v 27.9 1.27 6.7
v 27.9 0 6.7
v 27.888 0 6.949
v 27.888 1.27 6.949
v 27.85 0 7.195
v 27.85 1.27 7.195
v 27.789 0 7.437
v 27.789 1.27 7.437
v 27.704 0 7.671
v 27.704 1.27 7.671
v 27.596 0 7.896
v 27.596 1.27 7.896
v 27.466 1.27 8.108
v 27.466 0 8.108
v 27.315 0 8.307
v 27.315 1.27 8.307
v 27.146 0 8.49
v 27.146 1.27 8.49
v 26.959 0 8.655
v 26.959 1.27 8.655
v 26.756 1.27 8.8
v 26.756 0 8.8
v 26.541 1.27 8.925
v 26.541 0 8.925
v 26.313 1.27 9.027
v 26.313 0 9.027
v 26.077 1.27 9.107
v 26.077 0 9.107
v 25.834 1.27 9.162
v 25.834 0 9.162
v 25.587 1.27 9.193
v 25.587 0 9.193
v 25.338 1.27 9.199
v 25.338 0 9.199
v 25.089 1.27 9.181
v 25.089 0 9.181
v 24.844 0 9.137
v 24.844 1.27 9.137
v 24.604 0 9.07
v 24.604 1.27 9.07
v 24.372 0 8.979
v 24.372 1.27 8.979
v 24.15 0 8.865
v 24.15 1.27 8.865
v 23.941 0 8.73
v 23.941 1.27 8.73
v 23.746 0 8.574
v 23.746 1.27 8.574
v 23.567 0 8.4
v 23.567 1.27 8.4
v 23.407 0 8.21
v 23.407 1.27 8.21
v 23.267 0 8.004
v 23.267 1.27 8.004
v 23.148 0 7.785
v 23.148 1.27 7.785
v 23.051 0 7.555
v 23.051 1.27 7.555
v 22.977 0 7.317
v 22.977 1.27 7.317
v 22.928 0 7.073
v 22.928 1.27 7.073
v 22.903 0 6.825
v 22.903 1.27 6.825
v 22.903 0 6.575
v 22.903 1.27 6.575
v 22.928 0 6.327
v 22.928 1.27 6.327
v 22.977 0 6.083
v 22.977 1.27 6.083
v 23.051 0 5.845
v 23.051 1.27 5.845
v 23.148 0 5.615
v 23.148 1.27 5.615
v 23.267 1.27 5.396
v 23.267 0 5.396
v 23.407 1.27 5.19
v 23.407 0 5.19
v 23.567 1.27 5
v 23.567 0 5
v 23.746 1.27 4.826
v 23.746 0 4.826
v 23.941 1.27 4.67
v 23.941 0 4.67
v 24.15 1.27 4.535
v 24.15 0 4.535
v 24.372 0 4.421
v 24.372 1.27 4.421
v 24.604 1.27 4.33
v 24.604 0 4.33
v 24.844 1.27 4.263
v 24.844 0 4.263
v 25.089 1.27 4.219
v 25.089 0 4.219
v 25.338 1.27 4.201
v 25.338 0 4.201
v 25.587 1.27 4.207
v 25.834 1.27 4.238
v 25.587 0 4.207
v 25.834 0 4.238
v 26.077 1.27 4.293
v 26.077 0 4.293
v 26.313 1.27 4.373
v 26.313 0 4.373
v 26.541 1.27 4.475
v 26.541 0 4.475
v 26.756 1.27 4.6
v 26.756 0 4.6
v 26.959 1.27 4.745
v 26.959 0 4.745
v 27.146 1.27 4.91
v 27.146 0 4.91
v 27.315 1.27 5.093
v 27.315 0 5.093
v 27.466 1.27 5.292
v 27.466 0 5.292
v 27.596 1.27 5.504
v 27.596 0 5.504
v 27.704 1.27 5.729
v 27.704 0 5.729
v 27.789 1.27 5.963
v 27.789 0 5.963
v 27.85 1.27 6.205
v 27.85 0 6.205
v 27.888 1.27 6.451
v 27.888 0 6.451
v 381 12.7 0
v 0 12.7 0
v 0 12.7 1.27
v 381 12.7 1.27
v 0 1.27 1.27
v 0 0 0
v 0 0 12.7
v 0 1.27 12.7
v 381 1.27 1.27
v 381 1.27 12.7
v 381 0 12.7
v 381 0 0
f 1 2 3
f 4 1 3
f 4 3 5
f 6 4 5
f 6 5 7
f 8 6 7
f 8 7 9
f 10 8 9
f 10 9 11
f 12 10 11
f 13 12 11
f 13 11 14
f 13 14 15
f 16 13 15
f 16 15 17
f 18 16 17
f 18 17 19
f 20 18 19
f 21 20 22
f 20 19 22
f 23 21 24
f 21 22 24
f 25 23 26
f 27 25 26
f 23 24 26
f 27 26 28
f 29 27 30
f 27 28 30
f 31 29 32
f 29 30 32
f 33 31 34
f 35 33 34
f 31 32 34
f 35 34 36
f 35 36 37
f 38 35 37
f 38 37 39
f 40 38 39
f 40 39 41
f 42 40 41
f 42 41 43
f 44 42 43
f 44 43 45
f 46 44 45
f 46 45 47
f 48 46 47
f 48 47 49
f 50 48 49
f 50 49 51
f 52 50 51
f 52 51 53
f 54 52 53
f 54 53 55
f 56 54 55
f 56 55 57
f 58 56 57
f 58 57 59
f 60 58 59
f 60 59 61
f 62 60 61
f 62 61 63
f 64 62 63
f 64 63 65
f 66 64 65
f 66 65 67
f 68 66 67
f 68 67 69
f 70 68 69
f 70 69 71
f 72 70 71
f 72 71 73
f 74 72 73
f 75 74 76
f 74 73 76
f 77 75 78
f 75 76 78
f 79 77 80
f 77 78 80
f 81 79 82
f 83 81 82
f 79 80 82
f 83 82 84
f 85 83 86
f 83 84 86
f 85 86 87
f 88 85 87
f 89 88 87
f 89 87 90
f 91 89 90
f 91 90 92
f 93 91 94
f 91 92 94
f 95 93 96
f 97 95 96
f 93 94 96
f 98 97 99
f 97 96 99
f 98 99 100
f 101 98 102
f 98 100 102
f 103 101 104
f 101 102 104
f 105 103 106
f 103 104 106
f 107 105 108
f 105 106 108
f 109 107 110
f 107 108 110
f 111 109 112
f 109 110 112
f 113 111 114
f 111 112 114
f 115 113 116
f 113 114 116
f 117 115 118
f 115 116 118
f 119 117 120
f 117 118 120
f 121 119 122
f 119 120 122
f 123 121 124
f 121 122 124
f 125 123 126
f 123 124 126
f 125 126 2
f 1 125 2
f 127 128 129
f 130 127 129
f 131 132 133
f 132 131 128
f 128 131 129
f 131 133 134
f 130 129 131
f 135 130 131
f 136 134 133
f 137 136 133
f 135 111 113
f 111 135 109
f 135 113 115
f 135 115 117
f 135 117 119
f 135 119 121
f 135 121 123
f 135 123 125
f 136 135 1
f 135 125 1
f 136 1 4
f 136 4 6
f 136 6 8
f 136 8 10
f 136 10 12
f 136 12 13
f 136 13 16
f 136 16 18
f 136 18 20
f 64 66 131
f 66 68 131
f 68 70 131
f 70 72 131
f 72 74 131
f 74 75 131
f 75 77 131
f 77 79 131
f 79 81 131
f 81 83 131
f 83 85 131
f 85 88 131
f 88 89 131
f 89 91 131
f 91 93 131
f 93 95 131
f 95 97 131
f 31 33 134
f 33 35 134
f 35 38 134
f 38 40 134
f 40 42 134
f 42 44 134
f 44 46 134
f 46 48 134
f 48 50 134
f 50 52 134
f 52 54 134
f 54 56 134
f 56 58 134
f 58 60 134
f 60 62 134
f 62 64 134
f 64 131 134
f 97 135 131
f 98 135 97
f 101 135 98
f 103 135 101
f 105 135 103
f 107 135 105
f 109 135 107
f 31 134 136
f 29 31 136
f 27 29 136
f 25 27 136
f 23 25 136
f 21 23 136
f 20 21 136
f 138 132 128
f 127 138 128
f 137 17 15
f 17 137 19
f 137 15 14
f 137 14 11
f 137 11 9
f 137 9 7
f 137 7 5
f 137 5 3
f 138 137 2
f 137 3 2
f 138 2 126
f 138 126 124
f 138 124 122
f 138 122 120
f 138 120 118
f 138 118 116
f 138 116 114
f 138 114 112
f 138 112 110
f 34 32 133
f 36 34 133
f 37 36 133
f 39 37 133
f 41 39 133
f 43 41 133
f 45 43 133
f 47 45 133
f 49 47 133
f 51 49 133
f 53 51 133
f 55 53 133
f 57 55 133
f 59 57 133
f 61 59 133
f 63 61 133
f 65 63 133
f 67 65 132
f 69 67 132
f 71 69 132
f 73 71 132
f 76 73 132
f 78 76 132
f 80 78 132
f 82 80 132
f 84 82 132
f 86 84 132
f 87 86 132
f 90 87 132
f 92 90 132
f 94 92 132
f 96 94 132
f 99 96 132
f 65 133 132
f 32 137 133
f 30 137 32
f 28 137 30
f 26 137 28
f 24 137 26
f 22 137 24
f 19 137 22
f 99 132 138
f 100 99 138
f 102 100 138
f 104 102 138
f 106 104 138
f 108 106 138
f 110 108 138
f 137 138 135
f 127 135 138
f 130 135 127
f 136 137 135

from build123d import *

# Parameters (mm, degrees)
F1_DEPTH = 381
F2_R     = 2.5
F3_DEPTH = 25.4


with BuildPart() as f1:
    # F0 (on Right) → F1 (new body)
    with BuildSketch(Plane.YZ):
        Polygon((0, 12.7), (0, 0), (12.7, 0), (12.7, 1.27), (1.27, 1.27), (1.27, 12.7), align=None)
    extrude(amount=F1_DEPTH)

    # F2 (on face) → F3 (cut)
    with BuildSketch(Plane.XZ):
        with Locations((25.4, 6.7)):
            Circle(F2_R)
    extrude(amount=-F3_DEPTH, mode=Mode.SUBTRACT)


solid = f1.part
